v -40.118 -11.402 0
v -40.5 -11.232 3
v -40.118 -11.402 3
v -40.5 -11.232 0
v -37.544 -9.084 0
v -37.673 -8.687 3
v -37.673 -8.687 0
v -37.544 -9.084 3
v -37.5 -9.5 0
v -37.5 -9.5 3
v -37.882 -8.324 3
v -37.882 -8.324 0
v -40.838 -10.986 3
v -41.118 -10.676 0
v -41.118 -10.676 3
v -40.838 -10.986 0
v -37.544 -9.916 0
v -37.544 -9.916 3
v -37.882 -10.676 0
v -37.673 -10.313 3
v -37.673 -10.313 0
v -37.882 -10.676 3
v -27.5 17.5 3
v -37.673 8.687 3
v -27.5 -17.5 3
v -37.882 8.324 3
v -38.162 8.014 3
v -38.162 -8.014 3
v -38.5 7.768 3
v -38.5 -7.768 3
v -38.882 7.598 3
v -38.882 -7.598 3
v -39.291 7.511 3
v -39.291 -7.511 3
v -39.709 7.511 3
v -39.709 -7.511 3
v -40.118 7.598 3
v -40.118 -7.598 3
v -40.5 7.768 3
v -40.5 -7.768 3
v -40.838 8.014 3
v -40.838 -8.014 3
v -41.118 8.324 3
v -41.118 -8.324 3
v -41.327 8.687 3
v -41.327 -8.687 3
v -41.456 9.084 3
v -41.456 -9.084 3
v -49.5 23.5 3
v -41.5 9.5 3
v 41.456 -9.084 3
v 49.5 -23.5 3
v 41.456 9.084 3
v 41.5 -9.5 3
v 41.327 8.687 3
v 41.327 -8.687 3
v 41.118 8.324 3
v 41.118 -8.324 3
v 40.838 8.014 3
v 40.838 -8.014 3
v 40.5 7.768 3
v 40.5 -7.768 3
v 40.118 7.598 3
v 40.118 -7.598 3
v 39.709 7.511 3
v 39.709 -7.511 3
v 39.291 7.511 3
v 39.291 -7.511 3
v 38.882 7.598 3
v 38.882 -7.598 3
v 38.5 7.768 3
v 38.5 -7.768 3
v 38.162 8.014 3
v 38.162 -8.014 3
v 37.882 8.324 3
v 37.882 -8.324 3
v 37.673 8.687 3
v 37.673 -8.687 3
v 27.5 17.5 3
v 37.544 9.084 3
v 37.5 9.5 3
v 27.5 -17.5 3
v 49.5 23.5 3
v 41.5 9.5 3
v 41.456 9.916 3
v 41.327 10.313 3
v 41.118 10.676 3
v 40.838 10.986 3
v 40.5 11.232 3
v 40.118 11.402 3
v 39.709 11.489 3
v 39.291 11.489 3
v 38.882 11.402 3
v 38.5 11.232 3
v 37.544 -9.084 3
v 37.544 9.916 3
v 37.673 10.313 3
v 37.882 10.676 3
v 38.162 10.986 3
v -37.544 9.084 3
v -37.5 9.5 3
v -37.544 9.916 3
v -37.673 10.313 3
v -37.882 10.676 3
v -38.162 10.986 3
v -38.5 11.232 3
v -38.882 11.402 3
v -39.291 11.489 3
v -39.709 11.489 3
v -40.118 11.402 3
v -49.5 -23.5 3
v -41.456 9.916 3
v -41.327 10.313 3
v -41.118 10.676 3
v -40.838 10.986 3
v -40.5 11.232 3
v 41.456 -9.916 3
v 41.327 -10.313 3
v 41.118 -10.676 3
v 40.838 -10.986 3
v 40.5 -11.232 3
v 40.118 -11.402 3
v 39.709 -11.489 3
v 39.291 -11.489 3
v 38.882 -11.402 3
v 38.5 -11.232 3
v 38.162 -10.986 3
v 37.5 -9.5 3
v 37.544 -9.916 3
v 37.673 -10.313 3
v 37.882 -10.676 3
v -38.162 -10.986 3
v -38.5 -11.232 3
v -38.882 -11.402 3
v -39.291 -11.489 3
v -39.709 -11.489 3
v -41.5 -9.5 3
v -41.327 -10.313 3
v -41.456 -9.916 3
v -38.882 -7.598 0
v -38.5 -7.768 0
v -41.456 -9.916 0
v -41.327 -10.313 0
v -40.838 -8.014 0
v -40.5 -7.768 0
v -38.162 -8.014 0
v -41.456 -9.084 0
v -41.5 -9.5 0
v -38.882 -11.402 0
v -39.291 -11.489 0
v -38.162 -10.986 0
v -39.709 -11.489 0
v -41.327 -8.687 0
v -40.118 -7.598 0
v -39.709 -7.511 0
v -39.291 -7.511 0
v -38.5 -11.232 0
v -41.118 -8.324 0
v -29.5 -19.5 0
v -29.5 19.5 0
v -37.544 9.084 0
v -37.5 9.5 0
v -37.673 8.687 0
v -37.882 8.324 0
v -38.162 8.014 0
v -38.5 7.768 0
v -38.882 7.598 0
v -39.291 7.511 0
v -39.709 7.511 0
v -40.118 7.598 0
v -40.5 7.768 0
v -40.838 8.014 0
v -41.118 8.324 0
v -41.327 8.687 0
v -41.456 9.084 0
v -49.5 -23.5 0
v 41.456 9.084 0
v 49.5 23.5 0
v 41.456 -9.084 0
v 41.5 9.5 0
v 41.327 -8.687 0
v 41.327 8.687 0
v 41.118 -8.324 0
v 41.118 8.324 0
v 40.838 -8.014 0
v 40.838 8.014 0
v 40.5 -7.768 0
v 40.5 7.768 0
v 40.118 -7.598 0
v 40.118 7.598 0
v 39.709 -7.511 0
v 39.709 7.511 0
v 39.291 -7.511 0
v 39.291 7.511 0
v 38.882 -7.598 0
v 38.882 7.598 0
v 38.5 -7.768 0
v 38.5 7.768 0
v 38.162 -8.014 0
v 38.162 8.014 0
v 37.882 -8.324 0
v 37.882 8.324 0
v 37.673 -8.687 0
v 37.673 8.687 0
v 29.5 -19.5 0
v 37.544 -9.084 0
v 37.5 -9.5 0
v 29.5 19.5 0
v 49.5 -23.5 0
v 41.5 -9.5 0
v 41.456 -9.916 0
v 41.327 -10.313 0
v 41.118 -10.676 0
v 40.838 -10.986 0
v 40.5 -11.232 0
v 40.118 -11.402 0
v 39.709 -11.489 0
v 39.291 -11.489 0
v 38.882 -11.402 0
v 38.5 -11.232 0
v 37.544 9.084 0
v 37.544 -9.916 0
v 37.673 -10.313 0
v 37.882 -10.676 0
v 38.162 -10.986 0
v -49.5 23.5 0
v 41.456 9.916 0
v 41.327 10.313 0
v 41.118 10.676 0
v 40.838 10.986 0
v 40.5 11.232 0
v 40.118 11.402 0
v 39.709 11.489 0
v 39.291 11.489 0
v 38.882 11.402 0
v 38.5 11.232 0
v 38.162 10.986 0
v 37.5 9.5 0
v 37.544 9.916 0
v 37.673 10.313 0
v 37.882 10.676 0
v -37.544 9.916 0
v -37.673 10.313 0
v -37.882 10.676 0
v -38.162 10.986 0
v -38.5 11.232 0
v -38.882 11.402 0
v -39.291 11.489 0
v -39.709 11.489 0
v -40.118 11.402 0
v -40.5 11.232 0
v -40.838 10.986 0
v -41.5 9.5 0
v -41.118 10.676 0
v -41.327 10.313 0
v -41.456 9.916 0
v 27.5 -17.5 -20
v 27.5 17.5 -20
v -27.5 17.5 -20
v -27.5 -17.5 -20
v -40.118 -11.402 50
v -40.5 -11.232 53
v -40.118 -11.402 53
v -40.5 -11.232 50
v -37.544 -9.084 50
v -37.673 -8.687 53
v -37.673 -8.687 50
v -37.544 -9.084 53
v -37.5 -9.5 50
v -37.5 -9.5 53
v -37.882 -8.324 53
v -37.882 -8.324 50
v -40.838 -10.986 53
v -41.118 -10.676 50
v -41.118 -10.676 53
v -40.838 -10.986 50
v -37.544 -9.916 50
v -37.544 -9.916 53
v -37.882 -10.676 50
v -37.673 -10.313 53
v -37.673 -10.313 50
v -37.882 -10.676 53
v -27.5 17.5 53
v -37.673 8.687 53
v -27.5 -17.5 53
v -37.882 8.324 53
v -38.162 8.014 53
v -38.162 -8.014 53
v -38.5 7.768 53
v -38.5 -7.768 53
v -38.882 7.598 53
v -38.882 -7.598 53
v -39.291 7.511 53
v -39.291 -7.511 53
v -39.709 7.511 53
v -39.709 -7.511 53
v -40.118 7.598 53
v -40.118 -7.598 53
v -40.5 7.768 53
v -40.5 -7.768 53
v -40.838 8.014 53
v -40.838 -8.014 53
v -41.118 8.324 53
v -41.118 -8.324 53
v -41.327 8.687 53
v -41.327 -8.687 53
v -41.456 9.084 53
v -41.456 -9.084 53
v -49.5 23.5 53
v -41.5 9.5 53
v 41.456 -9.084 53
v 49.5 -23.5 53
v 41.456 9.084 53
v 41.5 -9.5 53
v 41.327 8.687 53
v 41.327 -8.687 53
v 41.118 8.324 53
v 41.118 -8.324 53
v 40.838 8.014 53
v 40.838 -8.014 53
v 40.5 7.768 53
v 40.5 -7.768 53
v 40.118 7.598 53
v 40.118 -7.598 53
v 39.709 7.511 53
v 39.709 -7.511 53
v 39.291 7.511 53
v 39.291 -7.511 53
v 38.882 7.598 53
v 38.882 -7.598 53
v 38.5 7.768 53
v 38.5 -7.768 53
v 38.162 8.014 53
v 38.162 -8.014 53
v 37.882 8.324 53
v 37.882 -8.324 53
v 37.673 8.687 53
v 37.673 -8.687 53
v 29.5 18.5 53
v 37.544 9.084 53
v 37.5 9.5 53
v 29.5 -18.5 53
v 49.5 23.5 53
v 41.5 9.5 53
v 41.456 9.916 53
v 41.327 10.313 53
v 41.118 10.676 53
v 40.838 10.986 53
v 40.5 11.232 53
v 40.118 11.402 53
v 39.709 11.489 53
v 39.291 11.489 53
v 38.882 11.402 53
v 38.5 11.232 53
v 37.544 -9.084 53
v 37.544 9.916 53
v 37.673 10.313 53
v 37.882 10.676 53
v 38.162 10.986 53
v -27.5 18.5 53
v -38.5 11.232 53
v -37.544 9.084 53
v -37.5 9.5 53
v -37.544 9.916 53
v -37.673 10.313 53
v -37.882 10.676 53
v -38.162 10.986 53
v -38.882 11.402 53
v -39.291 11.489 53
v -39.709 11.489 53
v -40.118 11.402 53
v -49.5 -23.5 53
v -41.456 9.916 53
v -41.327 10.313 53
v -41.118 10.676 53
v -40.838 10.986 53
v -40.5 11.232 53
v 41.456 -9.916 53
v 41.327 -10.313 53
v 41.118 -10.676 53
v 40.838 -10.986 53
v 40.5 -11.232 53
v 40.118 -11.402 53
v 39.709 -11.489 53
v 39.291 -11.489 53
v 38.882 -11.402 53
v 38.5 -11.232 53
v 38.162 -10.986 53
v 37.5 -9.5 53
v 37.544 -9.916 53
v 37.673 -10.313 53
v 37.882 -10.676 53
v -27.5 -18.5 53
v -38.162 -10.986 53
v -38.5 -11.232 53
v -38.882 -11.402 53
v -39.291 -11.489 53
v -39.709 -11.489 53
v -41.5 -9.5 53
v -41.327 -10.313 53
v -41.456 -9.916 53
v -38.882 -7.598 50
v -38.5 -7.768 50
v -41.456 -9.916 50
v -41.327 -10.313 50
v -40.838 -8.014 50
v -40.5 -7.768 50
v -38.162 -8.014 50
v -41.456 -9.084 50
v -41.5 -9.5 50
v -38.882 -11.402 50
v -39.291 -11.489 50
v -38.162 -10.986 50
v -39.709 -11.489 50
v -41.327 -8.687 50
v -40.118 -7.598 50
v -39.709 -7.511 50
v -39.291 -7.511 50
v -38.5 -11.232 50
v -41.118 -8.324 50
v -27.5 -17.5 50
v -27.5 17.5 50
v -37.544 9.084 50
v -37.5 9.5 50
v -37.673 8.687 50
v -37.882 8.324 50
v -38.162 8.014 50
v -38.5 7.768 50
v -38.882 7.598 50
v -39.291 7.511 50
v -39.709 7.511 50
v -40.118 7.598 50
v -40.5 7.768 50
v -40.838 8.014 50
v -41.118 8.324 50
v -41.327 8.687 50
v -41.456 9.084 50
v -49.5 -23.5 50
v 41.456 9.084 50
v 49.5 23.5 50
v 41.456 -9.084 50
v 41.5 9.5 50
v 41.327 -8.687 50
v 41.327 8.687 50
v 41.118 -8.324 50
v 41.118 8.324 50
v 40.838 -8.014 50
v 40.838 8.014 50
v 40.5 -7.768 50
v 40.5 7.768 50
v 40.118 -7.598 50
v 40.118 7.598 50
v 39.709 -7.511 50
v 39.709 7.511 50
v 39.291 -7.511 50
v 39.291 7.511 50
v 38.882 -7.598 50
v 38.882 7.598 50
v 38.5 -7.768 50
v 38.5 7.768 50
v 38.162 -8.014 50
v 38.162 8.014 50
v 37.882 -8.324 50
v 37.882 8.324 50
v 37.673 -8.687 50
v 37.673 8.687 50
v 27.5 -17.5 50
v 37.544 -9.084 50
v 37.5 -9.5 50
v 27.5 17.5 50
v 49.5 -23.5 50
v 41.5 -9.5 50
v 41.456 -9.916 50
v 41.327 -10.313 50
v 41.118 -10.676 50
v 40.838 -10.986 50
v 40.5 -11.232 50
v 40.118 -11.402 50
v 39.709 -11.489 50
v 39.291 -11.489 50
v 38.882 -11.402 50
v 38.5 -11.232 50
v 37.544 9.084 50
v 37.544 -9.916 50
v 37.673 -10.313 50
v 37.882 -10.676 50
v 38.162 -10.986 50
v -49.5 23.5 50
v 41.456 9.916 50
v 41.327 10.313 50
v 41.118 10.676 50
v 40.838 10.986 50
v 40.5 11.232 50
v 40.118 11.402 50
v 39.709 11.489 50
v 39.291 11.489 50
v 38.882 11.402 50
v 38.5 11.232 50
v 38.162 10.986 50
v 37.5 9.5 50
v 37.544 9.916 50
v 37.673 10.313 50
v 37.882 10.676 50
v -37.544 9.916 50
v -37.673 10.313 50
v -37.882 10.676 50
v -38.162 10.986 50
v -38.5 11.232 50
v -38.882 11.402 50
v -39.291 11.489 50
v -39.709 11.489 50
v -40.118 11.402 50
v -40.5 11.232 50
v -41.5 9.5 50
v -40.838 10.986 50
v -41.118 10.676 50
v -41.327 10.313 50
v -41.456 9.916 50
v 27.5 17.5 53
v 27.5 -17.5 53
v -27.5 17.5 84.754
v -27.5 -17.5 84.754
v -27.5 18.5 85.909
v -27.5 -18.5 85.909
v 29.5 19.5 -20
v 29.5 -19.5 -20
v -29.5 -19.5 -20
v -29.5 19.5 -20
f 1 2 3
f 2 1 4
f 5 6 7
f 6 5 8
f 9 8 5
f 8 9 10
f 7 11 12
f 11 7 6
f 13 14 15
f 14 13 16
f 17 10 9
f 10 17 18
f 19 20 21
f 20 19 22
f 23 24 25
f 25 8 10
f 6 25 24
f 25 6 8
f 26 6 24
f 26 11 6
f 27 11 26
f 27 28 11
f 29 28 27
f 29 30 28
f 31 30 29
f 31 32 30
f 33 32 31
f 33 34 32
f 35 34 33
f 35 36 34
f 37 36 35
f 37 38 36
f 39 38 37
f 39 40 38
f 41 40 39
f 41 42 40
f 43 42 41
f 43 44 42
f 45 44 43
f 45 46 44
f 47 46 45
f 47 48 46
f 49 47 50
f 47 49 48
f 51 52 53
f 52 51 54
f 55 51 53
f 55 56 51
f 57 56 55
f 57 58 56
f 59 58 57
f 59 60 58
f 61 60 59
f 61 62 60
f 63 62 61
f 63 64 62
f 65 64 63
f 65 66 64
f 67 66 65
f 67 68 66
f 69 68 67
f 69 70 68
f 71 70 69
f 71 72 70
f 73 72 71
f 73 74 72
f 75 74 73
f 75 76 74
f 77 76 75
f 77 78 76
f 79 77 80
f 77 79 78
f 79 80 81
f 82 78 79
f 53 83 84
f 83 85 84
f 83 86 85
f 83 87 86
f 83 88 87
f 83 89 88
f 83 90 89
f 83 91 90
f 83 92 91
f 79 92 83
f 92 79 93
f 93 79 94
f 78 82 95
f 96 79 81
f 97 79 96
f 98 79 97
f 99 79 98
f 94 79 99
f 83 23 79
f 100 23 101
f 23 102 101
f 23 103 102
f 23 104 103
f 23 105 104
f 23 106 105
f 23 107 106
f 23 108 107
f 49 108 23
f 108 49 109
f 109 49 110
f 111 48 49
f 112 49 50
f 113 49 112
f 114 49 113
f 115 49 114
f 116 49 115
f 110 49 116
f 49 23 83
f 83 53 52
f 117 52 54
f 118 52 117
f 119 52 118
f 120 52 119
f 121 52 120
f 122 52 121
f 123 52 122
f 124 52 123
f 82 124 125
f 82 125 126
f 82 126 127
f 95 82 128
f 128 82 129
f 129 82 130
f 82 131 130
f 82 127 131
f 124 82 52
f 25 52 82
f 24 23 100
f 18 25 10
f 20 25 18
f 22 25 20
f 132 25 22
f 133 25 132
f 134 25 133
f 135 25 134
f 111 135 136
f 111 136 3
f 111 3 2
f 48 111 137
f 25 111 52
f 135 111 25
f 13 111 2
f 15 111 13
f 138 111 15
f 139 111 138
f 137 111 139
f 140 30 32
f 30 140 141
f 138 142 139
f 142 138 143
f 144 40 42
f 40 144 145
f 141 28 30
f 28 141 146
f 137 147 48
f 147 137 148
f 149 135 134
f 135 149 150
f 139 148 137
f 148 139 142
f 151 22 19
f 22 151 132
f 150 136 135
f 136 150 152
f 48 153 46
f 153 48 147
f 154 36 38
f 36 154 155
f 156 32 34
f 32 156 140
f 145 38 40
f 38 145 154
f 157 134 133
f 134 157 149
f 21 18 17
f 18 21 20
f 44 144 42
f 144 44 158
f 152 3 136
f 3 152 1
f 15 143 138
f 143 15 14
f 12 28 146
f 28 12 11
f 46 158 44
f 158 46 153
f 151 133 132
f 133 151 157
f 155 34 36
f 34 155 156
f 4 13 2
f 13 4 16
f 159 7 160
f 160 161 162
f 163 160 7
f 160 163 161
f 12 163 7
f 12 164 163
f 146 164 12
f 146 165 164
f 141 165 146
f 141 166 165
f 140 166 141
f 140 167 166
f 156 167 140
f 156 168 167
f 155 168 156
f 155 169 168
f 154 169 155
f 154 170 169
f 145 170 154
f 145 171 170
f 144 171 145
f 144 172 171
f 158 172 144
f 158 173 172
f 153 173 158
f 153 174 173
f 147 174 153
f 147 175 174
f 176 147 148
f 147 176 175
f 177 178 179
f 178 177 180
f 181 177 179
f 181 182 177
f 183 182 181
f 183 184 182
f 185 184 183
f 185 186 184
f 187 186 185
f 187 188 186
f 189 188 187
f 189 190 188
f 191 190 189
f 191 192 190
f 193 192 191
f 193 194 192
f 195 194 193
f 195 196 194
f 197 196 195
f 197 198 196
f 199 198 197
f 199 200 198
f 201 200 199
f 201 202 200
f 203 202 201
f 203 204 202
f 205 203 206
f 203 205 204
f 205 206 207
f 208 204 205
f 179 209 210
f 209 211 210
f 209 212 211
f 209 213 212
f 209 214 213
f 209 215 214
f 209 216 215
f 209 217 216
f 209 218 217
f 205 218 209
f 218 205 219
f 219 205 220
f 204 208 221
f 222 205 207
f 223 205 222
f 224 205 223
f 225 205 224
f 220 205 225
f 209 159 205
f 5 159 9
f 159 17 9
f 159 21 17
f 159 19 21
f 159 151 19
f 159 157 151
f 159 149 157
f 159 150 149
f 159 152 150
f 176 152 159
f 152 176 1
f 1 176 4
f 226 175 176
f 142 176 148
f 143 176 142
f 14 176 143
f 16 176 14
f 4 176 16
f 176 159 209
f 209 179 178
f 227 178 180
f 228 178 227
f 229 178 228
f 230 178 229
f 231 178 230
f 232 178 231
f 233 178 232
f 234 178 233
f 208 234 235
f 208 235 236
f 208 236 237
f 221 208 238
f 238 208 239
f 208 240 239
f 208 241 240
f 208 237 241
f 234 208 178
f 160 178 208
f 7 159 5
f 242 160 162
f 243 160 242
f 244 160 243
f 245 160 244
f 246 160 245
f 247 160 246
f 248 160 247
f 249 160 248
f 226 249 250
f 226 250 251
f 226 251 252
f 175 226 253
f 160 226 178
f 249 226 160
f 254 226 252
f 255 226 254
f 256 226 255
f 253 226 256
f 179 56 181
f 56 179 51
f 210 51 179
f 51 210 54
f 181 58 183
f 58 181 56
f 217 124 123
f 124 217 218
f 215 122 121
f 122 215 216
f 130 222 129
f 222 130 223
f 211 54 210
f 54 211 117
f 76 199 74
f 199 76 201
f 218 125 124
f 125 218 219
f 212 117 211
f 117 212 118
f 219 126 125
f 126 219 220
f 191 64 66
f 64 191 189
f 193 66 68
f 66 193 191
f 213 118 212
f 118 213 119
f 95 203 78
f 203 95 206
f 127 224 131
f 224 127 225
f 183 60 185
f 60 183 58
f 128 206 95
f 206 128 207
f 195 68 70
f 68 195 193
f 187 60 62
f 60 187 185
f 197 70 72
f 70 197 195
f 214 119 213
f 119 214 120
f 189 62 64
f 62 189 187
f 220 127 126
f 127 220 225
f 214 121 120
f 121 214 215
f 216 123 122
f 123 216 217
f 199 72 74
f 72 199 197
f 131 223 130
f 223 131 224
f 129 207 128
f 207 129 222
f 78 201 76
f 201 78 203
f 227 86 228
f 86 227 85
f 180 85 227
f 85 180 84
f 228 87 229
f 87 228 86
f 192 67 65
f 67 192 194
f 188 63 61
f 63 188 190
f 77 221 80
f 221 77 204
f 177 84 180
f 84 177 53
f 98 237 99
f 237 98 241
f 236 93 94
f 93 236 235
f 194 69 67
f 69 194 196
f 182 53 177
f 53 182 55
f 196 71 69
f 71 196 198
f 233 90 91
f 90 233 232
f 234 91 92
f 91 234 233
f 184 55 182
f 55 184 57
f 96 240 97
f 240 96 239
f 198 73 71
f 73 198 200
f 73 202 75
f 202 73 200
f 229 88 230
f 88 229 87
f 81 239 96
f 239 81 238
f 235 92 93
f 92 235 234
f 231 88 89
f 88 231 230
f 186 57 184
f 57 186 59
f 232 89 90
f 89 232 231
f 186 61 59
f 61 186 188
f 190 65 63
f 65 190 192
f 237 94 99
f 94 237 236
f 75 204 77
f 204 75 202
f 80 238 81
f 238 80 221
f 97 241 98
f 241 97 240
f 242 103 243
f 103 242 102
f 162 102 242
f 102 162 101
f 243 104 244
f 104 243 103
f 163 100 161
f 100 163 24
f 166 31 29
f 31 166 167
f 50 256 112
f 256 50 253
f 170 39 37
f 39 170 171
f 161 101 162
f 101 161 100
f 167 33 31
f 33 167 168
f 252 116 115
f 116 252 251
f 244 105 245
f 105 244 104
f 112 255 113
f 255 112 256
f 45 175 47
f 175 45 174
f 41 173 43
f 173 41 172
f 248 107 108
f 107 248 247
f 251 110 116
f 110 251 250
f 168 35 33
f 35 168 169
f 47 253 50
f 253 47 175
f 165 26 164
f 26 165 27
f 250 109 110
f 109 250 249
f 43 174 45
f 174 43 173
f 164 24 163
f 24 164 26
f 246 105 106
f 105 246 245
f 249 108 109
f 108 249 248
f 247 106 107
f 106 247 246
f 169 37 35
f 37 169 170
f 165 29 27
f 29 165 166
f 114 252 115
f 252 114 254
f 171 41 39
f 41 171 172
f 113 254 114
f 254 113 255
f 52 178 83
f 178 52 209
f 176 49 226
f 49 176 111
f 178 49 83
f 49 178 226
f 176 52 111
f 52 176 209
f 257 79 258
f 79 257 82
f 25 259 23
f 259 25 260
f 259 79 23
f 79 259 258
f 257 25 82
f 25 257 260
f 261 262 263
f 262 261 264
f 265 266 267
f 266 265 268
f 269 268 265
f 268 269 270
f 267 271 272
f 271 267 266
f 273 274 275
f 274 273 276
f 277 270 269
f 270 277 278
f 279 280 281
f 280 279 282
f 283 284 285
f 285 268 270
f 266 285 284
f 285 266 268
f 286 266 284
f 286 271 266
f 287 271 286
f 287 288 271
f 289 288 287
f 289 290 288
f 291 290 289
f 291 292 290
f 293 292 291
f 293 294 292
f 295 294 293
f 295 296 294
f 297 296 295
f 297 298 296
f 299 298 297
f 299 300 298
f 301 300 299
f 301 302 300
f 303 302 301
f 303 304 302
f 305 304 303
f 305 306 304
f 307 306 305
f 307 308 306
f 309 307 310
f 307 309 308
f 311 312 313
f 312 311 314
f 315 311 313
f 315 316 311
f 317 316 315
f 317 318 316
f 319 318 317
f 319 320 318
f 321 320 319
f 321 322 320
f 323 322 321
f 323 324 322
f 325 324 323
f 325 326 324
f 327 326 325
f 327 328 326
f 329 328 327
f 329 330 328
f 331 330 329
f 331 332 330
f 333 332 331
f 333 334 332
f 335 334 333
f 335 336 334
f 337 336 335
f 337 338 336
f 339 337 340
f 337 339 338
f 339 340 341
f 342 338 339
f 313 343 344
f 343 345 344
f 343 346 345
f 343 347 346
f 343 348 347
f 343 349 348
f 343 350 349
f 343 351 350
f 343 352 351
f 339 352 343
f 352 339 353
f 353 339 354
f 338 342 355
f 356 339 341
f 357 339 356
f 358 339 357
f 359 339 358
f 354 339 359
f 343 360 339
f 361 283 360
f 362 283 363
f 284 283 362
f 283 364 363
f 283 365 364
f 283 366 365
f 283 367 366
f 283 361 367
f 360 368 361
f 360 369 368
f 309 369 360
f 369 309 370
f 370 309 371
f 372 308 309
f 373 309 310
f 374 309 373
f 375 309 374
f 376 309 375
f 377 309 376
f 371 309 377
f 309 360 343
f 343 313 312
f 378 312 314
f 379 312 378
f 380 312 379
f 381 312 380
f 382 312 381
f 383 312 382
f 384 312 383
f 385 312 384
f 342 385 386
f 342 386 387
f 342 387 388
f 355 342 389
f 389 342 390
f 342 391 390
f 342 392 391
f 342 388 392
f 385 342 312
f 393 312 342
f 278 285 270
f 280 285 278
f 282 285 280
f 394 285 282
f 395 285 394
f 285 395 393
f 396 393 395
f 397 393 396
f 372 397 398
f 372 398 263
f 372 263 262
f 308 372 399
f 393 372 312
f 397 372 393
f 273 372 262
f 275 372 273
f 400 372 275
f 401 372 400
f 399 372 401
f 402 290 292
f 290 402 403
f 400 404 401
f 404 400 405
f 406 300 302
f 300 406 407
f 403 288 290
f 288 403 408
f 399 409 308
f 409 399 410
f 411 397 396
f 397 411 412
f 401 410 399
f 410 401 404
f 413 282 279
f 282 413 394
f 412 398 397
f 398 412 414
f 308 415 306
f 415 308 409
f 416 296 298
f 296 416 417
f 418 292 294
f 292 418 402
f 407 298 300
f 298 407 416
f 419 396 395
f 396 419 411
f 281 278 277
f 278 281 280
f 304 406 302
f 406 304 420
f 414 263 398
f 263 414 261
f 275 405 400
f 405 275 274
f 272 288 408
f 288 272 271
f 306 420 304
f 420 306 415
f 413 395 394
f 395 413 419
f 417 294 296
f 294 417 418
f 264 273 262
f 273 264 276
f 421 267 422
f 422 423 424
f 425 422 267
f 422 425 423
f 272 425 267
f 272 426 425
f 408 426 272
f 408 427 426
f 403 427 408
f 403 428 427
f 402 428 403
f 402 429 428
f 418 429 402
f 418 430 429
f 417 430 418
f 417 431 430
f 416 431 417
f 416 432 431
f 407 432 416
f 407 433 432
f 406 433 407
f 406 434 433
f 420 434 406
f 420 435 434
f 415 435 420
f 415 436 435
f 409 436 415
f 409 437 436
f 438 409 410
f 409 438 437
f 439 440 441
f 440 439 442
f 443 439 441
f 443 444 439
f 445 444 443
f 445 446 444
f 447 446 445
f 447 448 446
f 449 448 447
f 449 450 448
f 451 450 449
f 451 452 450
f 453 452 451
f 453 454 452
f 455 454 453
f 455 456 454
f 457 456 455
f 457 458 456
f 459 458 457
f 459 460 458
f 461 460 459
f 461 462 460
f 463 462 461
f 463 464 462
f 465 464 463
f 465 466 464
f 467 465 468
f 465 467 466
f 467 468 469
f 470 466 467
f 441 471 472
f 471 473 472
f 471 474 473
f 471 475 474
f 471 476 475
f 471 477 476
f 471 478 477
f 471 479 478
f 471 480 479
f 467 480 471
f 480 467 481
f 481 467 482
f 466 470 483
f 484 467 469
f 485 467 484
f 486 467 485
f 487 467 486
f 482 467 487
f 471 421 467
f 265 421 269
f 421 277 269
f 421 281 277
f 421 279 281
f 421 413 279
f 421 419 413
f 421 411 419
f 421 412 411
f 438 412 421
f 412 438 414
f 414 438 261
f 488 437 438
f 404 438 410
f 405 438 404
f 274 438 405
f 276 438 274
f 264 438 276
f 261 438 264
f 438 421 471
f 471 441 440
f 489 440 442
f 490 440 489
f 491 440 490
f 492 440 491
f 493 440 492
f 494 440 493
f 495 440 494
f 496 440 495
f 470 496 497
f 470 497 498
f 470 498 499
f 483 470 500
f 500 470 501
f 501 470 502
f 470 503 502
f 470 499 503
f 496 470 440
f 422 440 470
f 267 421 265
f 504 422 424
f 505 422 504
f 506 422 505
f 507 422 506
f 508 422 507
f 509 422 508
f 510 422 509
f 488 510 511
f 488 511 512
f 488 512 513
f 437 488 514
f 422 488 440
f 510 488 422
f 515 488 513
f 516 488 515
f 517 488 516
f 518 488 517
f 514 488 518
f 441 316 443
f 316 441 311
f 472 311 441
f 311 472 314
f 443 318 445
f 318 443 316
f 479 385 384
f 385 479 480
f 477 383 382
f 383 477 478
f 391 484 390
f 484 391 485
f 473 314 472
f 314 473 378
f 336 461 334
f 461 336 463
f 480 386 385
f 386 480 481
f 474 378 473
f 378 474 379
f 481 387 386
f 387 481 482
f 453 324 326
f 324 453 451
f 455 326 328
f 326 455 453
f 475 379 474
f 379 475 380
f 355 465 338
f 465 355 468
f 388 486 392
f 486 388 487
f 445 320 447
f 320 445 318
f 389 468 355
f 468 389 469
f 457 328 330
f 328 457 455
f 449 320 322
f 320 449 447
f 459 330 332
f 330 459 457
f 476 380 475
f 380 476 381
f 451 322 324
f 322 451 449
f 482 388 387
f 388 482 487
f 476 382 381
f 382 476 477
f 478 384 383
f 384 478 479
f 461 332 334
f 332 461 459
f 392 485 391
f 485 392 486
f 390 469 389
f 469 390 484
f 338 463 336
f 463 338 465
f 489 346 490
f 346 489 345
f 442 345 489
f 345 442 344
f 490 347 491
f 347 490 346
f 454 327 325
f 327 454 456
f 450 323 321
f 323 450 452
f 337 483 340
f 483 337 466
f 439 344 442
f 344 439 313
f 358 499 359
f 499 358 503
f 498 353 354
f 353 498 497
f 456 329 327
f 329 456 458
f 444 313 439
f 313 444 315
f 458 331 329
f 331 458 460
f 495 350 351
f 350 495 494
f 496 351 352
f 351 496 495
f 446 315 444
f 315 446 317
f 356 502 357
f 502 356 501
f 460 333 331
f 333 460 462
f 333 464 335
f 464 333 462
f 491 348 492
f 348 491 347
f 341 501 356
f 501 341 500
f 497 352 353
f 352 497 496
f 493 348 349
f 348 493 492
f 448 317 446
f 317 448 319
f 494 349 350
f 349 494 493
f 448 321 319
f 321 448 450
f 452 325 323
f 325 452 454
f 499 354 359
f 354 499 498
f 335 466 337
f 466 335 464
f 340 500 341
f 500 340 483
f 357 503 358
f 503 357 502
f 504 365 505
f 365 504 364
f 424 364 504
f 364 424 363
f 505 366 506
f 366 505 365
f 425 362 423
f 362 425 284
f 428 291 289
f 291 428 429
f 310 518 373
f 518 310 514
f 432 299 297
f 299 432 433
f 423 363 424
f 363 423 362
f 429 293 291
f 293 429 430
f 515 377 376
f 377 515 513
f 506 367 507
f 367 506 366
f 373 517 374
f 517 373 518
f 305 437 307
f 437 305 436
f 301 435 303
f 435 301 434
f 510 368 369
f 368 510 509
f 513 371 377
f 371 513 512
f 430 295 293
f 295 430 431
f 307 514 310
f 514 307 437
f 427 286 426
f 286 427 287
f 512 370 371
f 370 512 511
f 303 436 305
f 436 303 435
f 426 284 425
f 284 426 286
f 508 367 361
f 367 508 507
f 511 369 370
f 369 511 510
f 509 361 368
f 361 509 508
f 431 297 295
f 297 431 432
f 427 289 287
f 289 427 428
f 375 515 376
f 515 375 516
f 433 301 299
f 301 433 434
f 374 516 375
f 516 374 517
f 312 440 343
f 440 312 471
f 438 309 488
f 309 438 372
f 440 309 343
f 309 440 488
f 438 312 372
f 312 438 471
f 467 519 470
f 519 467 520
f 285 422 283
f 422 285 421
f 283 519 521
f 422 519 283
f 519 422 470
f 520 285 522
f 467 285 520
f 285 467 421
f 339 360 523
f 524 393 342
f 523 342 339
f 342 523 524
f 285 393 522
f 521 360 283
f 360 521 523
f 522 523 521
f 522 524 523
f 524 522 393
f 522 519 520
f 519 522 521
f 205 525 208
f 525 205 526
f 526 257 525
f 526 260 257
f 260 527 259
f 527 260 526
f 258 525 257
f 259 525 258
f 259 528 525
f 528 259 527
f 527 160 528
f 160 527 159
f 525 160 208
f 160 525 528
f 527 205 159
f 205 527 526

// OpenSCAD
part = "both"; //[both, top, bottom]

ductWidth = 39; //[200]
ductLength = 59; //[200]
ductDepth = 20; //[200]

//Duct Wall Thickness
wallThickness = 2; //[10]

//Baseplate Width
plateWidth = 47; //[200]
//Baseplate Length
plateLength = 99; //[200]
basePlateThickness = 3; //[20]

outletAngleDegrees = 30; //[90]
outletWallThickness = 1; //[10]

//Screwhole Diameter
holeDiameter = 4; //[10]
//X-offset from outer edge to center of screwhole
xHoleOffset = 10; //[100]
//Y-offset from outer edge to center of screwhole
yHoleOffset = 14; //[100]

module mountingHoles(depth){
    x = plateLength - (2 * xHoleOffset);
    y = plateWidth - (2 * yHoleOffset);
    module mountingHole(depth, diameter) {
        cylinder(h = depth, r = 0.5 * diameter, center = false, $fs=0.1);
    }
    union(){
        mountingHole(depth, holeDiameter);
        translate([x,0]) mountingHole(depth, holeDiameter);
        translate([x,y]) mountingHole(depth, holeDiameter);
        translate([0,y]) mountingHole(depth, holeDiameter);
    }
}

module basePlate(){
    cutoutX = ductLength - 2 * wallThickness;
    cutoutY = ductWidth - 2 * wallThickness;
    translate([-0.5 * plateLength, -0.5 * plateWidth]) difference(){
        cube(size = [plateLength, plateWidth, basePlateThickness]);
        translate([xHoleOffset, yHoleOffset, 0]){
            mountingHoles(basePlateThickness);
        }
        translate([0.5 * (plateLength - cutoutX), 0.5 * (plateWidth - cutoutY), 0]){ 
            cube(size = [ cutoutX, cutoutY, basePlateThickness]);
        }
    }
}

module ductPipe(){
    translate([-0.5 * ductLength, -0.5 * ductWidth]) difference(){
        cube(size = [ductLength, ductWidth, ductDepth]);
        translate([wallThickness, wallThickness]){
            cube(size = [
                ductLength - 2 * wallThickness,
                ductWidth - 2 * wallThickness,
                ductDepth]);
        }
    }
}

module duct(){
    basePlate(plateLength, plateWidth);
    translate([0, 0, -1 * ductDepth]) ductPipe();
}

module outlet(){
    innerWidth = ductWidth - 2 * wallThickness;
    innerLength = ductLength - 2 * wallThickness;
    innerHeight = tan(outletAngleDegrees) * innerLength;
    
    outerWidth = innerWidth + 2 * outletWallThickness;
    outerHeight = innerHeight + (outletWallThickness/cos(outletAngleDegrees));
    outerLength = outerHeight / tan(outletAngleDegrees);
    
    translate([-0.5 * innerLength, -0.5 * outerWidth, 0]){
        difference(){
            //Outer
            translate ([0, outerWidth, 0]) rotate([90, 0, 0]) linear_extrude(outerWidth){
                polygon(points=[
                    [0, 0],
                    [0, outerHeight], 
                    [outerLength, 0]
                ]);
            }
            //Inner
            translate([0, innerWidth + outletWallThickness, 0]){
                rotate([90, 0, 0]) linear_extrude(innerWidth){
                    polygon(points=[
                        [0, 0],
                        [0, innerHeight], 
                        [innerLength, 0]
                    ]);
                }
            }
        }
    }
}

module ductCover() {
    basePlate(plateLength, plateWidth);
    translate([0, 0, basePlateThickness]) outlet();
}

if(part == "both"){
    translate([0, 0, 50]) ductCover();
    duct();
} else if(part == "top"){
    ductCover();
} else{
    duct();
}
